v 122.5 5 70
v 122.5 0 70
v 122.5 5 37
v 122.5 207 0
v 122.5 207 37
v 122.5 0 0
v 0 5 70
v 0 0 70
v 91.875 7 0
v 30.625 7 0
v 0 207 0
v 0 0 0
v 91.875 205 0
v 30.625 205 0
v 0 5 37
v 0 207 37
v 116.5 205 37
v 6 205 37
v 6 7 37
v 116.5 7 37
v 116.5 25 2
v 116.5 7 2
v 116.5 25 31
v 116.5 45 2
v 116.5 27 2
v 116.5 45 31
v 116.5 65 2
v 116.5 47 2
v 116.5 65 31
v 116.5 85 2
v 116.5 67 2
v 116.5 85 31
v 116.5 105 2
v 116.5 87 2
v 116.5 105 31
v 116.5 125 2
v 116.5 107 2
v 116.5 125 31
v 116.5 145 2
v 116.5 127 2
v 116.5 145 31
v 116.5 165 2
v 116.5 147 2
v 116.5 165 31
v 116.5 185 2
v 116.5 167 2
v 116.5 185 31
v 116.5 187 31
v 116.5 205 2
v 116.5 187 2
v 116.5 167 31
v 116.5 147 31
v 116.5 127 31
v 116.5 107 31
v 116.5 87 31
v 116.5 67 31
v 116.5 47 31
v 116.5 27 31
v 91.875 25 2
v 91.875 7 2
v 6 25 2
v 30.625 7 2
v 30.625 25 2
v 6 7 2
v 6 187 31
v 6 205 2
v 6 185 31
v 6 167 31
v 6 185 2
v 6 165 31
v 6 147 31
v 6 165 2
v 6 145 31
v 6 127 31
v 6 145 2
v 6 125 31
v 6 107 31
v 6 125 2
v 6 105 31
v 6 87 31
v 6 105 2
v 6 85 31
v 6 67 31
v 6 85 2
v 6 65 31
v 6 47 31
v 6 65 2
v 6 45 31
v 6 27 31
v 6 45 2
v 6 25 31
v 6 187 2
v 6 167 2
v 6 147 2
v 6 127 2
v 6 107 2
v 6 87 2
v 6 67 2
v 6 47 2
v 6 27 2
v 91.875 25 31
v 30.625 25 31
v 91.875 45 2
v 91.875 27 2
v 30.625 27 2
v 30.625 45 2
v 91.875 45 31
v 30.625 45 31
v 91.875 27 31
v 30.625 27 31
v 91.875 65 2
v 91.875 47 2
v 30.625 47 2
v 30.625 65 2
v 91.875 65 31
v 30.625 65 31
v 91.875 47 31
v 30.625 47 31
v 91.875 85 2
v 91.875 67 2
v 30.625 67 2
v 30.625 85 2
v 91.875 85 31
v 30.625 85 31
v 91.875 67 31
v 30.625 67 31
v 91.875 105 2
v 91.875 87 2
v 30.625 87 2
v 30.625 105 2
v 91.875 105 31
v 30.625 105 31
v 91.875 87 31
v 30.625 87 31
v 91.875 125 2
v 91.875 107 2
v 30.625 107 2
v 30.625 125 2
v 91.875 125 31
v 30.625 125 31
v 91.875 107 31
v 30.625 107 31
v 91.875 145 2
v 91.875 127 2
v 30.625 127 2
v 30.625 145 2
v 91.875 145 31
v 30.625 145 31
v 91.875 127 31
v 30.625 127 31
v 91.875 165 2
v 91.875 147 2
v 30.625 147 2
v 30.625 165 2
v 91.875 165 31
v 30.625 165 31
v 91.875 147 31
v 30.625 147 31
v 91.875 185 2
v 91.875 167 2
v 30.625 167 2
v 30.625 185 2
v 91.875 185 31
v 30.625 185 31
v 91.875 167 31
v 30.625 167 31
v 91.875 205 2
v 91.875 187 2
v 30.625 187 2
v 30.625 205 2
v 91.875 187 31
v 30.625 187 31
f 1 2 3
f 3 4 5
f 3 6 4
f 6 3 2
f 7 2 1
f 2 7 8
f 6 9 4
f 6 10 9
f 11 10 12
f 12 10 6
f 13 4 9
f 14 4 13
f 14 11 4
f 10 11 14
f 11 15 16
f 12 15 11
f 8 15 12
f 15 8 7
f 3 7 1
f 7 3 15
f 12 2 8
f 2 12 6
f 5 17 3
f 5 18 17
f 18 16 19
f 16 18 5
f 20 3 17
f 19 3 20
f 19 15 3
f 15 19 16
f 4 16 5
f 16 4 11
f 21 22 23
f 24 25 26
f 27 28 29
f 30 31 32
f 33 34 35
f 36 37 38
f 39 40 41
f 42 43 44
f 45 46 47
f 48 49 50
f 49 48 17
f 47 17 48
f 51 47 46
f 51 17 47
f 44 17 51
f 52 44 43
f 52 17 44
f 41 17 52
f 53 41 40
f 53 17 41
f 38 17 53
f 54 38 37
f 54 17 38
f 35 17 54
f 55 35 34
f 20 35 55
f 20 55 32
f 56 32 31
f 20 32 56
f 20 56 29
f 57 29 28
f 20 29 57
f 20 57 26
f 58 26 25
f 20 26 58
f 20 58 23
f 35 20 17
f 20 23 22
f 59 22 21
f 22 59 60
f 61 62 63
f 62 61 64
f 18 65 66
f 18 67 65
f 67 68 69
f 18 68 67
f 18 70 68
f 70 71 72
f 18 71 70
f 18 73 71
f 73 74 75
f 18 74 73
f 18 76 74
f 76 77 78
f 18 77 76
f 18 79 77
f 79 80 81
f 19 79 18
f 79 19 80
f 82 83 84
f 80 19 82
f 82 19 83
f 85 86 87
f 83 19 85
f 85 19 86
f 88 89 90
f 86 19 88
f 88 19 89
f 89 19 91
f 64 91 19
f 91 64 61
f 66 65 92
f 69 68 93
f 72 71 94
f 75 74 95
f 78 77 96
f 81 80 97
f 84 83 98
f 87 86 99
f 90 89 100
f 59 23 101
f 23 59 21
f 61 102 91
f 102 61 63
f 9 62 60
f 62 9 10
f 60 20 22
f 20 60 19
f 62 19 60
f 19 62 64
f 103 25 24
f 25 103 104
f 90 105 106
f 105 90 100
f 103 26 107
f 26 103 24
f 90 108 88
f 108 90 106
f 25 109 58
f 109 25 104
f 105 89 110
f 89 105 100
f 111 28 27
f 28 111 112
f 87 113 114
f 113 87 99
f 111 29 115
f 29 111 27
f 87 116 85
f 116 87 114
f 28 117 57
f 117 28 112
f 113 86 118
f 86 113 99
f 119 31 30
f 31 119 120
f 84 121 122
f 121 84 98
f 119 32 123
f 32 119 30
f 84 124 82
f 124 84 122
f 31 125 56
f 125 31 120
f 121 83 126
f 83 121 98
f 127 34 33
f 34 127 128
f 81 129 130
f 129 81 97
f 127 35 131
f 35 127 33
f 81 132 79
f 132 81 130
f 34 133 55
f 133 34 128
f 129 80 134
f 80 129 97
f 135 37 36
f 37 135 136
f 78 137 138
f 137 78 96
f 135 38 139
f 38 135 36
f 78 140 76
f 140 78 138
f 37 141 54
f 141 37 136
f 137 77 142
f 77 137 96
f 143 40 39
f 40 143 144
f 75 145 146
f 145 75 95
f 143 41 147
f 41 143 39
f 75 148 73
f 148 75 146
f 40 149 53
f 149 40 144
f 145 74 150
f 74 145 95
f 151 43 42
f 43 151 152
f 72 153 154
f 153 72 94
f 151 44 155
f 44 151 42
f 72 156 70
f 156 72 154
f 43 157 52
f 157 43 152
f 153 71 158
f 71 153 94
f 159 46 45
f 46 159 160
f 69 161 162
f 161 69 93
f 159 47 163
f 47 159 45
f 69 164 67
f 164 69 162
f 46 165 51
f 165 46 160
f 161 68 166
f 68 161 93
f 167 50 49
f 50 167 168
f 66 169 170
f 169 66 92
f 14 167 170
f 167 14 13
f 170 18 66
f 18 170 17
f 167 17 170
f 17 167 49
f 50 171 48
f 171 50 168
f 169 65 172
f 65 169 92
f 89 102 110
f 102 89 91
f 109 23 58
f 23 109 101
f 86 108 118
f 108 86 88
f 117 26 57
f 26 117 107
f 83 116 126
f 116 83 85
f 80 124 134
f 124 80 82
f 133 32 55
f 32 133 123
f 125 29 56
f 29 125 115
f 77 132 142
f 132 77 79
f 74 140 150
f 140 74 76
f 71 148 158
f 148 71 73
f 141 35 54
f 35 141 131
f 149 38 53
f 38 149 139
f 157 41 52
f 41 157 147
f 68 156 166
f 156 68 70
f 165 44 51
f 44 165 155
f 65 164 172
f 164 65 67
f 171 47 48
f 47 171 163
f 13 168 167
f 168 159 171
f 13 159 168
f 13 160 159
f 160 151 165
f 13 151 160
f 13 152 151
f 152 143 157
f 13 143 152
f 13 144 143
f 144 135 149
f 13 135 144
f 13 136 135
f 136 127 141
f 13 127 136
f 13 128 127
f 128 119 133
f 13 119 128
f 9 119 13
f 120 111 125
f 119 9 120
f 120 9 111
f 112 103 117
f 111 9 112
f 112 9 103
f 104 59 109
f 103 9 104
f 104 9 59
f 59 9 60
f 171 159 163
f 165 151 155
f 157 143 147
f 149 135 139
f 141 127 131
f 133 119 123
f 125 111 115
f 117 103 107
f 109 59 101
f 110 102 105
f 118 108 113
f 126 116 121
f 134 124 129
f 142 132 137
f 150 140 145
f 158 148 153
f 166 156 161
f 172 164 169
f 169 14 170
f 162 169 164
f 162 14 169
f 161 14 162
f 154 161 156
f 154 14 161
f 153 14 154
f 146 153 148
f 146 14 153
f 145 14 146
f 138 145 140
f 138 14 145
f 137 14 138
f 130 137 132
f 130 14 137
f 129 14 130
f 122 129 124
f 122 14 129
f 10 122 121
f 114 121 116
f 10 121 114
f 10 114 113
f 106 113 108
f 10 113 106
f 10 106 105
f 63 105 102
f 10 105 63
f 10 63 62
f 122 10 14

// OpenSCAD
// Single Tower Casette Tape Holder
// by Nathan Wittstock <nate@fardog.io>

// preview[view:south east, tilt:top diagonal]

/* [Cassette] */
number_of_cassettes = 10; //[5:15]
x_tolerance = 1.5; //[1.0:3.0]
y_tolerance = 1.0; //[1.0:3.0]

/* [Hidden] */
case_height = 109.0 + x_tolerance;
case_width = 17.0 + y_tolerance;
case_depth = 70.0;
case_padding = 6;
foot_height = 5;

wall_thickness_min = 2;

case_pocket_height = case_depth - (case_depth / 2);
case_pocket_gap = wall_thickness_min;

base_height = case_pocket_height + wall_thickness_min;
base_depth = (case_width + case_pocket_gap) * number_of_cassettes + case_pocket_gap + foot_height;
base_width = case_height + (case_padding * 2);

module base() {
	cube([base_width, base_depth, base_height]);
}

module foot() {
	cube([base_width, foot_height, case_depth]);
}

module case_slots() {
	union() {
		for (i = [0:number_of_cassettes - 1]) {
			current_y = case_pocket_gap + ((case_width + case_pocket_gap) * i);
			translate([case_padding, current_y, base_height - case_pocket_height])
			cube([case_height, case_width, case_pocket_height + 1]);
		}
	}
}

module depth_cutout() {
	union() {
		translate([case_padding, case_padding, base_height - case_padding])
			cube([base_width - (case_padding * 2), base_depth - (case_padding * 2) - wall_thickness_min, case_padding * 2]);
		translate([base_width / 4, wall_thickness_min, 0])
			cube([base_width / 2, base_depth - foot_height - (wall_thickness_min * 2), case_pocket_height]);
	}
}

difference() {
	union() {
		foot();
		base();
	}
	translate([0, foot_height, 0]) {
		union() {
			case_slots();
			depth_cutout();
		}
	}
}
